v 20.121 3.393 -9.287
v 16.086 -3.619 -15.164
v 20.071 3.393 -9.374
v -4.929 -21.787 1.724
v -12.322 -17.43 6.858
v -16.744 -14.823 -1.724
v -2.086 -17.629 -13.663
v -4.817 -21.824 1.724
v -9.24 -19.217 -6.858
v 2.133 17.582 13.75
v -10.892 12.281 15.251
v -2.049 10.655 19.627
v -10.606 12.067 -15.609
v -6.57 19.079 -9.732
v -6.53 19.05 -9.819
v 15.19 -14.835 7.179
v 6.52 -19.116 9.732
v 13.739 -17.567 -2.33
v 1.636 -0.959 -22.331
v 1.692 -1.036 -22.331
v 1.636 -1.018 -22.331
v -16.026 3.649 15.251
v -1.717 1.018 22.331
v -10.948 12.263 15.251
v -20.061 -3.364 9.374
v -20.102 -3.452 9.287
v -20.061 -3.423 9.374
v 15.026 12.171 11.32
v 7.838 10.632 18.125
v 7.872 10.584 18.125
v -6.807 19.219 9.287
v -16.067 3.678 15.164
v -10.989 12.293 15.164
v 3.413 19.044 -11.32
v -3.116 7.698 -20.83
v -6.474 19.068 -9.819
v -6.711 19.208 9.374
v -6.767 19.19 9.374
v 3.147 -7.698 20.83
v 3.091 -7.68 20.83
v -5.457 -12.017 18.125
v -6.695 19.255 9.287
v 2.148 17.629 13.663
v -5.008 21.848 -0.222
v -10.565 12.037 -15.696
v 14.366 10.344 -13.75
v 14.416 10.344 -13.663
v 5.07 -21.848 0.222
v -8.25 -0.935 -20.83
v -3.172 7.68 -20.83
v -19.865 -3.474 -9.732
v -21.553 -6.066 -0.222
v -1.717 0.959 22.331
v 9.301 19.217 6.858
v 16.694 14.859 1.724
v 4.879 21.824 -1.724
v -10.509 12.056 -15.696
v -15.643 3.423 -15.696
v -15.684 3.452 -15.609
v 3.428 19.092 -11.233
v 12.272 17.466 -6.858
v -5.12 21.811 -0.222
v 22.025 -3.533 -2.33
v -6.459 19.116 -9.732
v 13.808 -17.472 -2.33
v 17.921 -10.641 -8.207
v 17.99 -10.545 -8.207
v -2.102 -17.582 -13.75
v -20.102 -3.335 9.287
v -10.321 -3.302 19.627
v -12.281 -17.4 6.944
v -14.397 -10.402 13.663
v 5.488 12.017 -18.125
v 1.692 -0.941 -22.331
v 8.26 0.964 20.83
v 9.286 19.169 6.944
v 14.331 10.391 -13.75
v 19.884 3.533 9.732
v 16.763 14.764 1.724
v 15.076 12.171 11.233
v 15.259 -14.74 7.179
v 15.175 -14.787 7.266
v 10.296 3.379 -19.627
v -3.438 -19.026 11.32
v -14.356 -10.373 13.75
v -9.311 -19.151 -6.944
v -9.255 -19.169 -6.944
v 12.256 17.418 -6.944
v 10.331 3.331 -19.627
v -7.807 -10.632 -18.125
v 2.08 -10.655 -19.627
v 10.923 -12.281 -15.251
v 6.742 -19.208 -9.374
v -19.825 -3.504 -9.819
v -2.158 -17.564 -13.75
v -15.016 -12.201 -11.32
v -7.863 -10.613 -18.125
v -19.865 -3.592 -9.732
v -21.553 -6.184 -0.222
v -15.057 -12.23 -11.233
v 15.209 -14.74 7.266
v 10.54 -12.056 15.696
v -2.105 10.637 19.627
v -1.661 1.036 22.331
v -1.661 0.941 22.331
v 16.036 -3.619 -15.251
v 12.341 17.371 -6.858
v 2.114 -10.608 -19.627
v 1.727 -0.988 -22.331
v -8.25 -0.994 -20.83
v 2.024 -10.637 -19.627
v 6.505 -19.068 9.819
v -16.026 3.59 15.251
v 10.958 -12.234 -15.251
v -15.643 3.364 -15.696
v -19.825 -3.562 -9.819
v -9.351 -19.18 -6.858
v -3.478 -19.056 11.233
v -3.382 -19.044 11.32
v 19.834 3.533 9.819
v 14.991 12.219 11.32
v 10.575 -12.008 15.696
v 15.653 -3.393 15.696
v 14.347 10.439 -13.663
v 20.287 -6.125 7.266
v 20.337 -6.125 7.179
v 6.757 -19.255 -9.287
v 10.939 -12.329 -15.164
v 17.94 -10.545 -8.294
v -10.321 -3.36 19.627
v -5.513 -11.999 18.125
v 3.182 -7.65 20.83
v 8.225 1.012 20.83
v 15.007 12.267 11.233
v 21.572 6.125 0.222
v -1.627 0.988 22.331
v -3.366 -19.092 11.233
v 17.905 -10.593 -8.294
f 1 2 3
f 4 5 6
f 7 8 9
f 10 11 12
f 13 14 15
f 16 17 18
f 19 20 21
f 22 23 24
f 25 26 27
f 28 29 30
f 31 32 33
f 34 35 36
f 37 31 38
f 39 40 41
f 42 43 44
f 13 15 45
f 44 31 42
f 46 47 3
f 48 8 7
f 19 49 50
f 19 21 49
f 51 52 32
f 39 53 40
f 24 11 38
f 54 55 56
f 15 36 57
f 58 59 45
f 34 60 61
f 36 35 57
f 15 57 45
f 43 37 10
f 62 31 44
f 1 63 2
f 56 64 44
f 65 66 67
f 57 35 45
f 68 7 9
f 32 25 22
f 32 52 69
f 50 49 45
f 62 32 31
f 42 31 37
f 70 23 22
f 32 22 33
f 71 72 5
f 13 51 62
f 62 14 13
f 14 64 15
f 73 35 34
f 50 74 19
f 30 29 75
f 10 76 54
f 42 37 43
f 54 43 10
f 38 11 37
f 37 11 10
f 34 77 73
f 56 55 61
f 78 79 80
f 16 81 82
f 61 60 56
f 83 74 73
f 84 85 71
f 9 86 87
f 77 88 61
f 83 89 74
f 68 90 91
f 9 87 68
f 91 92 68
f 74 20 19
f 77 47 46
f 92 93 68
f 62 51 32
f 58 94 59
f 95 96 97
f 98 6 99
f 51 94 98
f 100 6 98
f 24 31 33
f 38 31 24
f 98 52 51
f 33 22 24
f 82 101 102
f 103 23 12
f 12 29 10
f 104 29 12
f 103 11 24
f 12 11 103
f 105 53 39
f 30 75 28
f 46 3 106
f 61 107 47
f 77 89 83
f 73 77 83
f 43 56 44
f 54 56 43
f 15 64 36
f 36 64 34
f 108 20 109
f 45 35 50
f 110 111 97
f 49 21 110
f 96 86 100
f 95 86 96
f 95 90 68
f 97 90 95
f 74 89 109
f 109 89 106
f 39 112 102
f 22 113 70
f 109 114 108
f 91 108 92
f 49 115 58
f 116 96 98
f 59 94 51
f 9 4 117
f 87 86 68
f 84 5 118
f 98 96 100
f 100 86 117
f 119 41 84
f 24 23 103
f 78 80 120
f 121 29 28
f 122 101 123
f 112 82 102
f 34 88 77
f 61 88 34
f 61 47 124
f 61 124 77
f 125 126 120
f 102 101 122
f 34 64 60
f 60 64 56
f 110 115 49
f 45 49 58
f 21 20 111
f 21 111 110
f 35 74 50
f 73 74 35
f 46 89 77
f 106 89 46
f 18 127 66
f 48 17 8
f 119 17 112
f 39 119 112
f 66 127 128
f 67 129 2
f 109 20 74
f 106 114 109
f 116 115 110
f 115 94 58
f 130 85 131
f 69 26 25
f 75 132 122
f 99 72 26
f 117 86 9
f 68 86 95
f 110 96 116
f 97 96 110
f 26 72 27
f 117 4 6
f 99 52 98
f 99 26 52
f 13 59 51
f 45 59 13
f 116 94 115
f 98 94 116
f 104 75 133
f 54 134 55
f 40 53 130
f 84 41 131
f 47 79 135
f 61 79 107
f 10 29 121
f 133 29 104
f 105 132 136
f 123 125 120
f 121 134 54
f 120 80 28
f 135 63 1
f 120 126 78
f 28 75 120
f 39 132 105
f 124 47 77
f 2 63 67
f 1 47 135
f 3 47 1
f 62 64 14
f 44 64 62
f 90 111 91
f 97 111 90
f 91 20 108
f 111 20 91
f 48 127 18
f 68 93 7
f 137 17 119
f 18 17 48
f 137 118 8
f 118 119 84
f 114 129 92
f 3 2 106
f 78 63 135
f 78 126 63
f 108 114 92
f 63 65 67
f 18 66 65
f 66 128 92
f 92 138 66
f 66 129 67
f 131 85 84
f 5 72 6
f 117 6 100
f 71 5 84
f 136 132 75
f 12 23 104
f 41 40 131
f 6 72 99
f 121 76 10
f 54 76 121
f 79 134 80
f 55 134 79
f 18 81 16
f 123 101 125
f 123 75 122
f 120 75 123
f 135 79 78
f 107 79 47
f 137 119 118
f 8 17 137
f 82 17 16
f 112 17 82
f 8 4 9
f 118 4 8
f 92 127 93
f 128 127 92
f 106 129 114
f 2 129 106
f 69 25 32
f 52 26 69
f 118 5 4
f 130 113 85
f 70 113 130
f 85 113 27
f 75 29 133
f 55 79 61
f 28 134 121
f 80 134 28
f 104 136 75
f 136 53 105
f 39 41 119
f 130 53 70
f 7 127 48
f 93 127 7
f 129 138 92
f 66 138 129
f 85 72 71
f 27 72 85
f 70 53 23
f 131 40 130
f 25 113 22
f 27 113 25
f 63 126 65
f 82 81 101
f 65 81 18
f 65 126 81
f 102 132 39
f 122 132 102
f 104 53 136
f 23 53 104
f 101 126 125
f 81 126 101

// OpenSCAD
// Auto-generated OpenSCAD file

    inner_points = 10*[[-2.147181721933595, -0.6125228911105931, -0.022233721226839975], [1.4975738002339152, 1.2171443618142557, 1.123343354837028], [-1.6663340255978591, -1.4763745869015392, -0.1723861125089058], [1.9784214965696507, 0.35329266602330955, 0.9731909635549623], [-1.9784214965696507, -0.35329266602330955, -0.9731909635549623], [1.6663340255978591, 1.4763745869015392, 0.1723861125089058], [-1.4975738002339152, -1.2171443618142557, -1.123343354837028], [2.147181721933595, 0.6125228911105931, 0.022233721226839975], [-1.0280687737374308, -0.3330955036984619, 1.954018925031606], [-0.1676587091381568, 0.0988303441971033, 2.224452988448126], [-0.547221077401695, -1.1969471994894083, 1.80386653374954], [0.313188987197579, -0.765021351593843, 2.07430059716606], [-0.313188987197579, 0.765021351593843, -2.07430059716606], [0.547221077401695, 1.1969471994894083, -1.80386653374954], [0.1676587091381568, -0.0988303441971033, -2.224452988448126], [1.0280687737374308, 0.3330955036984619, -1.954018925031606], [-0.6726268446335121, 1.9160150643285994, 0.9287235210998099], [0.503866619269568, -2.1752452894158827, 0.022233721228312353], [2.0237176723082113, -0.6125228911102443, 0.7179487921524583], [-0.503866619269568, 2.1752452894158827, -0.022233721228312353], [0.6726268446335121, -1.9160150643285994, -0.9287235210998099], [2.1924778976721555, -0.3532926660229606, -0.23300845017566402], [0.927058622781811, 1.9121577495628521, 0.685771848512618], [-0.927058622781811, -1.9121577495628521, -0.685771848512618], [1.3708203463401416, -1.7471767562861986, -0.23300845017492777], [-1.4315815123496172, -1.0343501578436425, 1.3662950274254113], [0.8210012810337749, 0.09644639256656445, 2.0743005971656054], [-0.8210012810337749, -0.09644639256656445, -2.0743005971656054], [1.4315815123496172, 1.0343501578436425, -1.3662950274254113], [-1.0907716573533395, 1.2233856282105418, 1.516447418706741], [0.6489516514014413, -1.9020591684003363, 0.9731909635561535], [-0.6489516514014413, 1.9020591684003363, -0.9731909635561535], [1.0907716573533395, -1.2233856282105418, -1.516447418706741], [-2.0020966898017214, -0.33933677009504604, 0.9287235211010012], [0.7822487677665146, 1.0584046349342373, 1.8038665337483493], [-1.2240687737184126, -1.7370781751240318, 0.6857718485145453], [1.5602766838498234, -0.3393367700947481, 1.5609148611618933], [-1.5602766838498234, 0.3393367700947481, -1.5609148611618933], [1.2240687737184126, 1.7370781751240318, -0.6857718485145453], [-0.7822487677665146, -1.0584046349342373, -1.8038665337483493], [2.0020966898017214, 0.33933677009504604, -0.9287235211010012], [-1.5985839511895352, 0.36191788405013425, 1.516447418707196], [-0.20641122240541715, 1.0607885865647761, 1.9540189250308702], [-0.33970833877049067, -1.8996752167697974, 1.1233433548386742], [1.0524643900136275, -1.2008045142551556, 1.5609148611623485], [-1.0524643900136275, 1.2008045142551556, -1.5609148611623485], [0.33970833877049067, 1.8996752167697974, -1.1233433548386742], [0.20641122240541715, -1.0607885865647761, -1.9540189250308702], [1.5985839511895352, -0.36191788405013425, -1.516447418707196], [0.21173359031441008, 1.7534180226828338, 1.366295027423939], [-0.48479337090236396, -2.1728613377853443, 0.17238611251083324], [1.5159053784720158, -1.473990635270652, 0.7179487921529134], [0.48479337090236396, 2.1728613377853443, -0.17238611251083324], [-0.21173359031441008, -1.7534180226828338, -1.366295027423939], [1.7889651590599696, -1.0545473201681412, -0.8207323477818588]];

    outer_points = 10*[[0.8723958733185133, 0.06615064908058033, -2.0544141523419364], [0.15751608677391848, -1.0319662062139903, 1.973905369854271], [0.8270996975796362, 1.0319662062139903, -1.7991719809389455], [0.11221991103504136, -0.06615064908058033, 2.229147541257262], [-0.11221991103504136, 0.06615064908058033, -2.229147541257262], [-0.8270996975796362, -1.0319662062139903, 1.7991719809389455], [-0.15751608677391848, 1.0319662062139903, -1.973905369854271], [-0.8723958733185133, -0.06615064908058033, 2.0544141523419364], [2.1924778976724366, -0.35329266602279574, -0.23300845017327093], [2.0237176723073724, -0.6125228911106142, 0.7179487921545069], [2.1471817219335594, 0.6125228911106142, 0.022233721229720005], [1.9784214965684954, 0.35329266602279574, 0.9731909635574978], [-1.9784214965684954, -0.35329266602279574, -0.9731909635574978], [-2.1471817219335594, -0.6125228911106142, -0.022233721229720005], [-2.0237176723073724, 0.6125228911106142, -0.7179487921545069], [-2.1924778976724366, 0.35329266602279574, 0.23300845017327093], [0.5038666192695755, -2.1752452894158876, 0.022233721227690392], [0.4807491650839791, 2.1752452894158876, 0.15249966768763507], [0.14717764696877234, 0.9136323277340612, 2.0321620721418276], [-0.4807491650839791, -2.1752452894158876, -0.15249966768763507], [-0.5038666192695755, 2.1752452894158876, -0.022233721227690392], [-0.8374381373847823, 0.9136323277340612, 1.8574286832265023], [-0.24599665183756222, -1.7332208603588481, 1.3861814722472068], [0.24599665183756222, 1.7332208603588481, -1.3861814722472068], [-0.16086561818353615, 2.034330296982295, 0.9064714408993516], [2.0020966898028134, 0.33933677009559726, -0.9287235210984455], [1.5602766838479842, -0.33933677009559726, 1.560914861163547], [-1.5602766838479842, 0.33933677009559726, -1.560914861163547], [-2.0020966898028134, -0.33933677009559726, 0.9287235210984455], [1.3708203463404445, -1.7471767562860465, -0.23300845017428576], [1.2069372429567986, 1.7471767562860465, 0.690466401324062], [-1.2069372429567986, -1.7471767562860465, -0.690466401324062], [-1.3708203463404445, 1.7471767562860465, 0.23300845017428576], [1.598583951191333, -0.3619178840492606, -1.5164474187055097], [1.0524643900118018, -1.2008045142560126, 1.56091486116292], [1.5252931992854413, 1.2008045142560126, -1.103456910013144], [0.9791736381059102, 0.3619178840492606, 1.9739053698552858], [-0.9791736381059102, -0.3619178840492606, -1.9739053698552858], [-1.5252931992854413, -1.2008045142560126, 1.103456910013144], [-1.0524643900118018, 1.2008045142560126, -1.56091486116292], [-1.598583951191333, 0.3619178840492606, 1.5164474187055097], [1.7889651590609557, -1.0545473201676536, -0.820732347780335], [1.5159053784711902, -1.4739906352710297, 0.7179487921538799], [1.6703782314161868, 1.4739906352710297, -0.1524996676849783], [1.3973184508264214, 1.0545473201676536, 1.3861814722492365], [-1.3973184508264214, -1.0545473201676536, -1.3861814722492365], [-1.6703782314161868, -1.4739906352710297, 0.1524996676849783], [-1.5159053784711902, 1.4739906352710297, -0.7179487921538799], [-1.7889651590609557, 1.0545473201676536, 0.820732347780335], [0.6489516514003212, -1.9020591684008705, 0.9731909635558559], [0.9441901535433673, 1.9020591684008705, -0.6904664013214051], [0.5653224596892834, 1.6062617638524541, 1.4444381745357786], [-0.9441901535433673, -1.9020591684008705, 0.6904664013214051], [-0.6489516514003212, 1.9020591684008705, -0.9731909635558559], [-1.027819345254405, 1.6062617638524541, 1.1617136123013276]];

    // Convex hull for inner set (I)
    module inner_hull() {
        hull() {
            for (p = inner_points) {
                translate(p) sphere(r=0.1);
            }
        }
    }

    // Convex hull for outer set (O) minus inner hull (O \ I)
    module outer_minus_inner() {
        difference() {
            hull() {
                for (p = outer_points) {
                    translate(p) sphere(r=0.1);
                }
            }
            inner_hull(); // Subtract inner hull
        }
    }

    // Convex hull for outer set (O) minus all translated inner hulls
    module outer_minus_AllTranslationInner() {
        difference() {
            hull() {
                for (p = outer_points) {
                    translate(p) sphere(r=0.1);
                }
            }
            hull() {
                translate([0,0,50]) inner_hull();
                translate([0,0,-50]) inner_hull();
            }; // Subtract translated inner hulls
        }
    }

    // Difference between outer_minus_inner and outer_minus_AllTranslationInner
    module outer_minus_inner_diff() {
        difference() {
            // Outer minus inner
            difference() {
                hull() {
                    for (p = outer_points) {
                        translate(p) sphere(r=0.1);
                    }
                }
                inner_hull();
            }

            // Subtract Outer minus AllTranslationInner
            difference() {
                hull() {
                    for (p = outer_points) {
                        translate(p) sphere(r=0.1);
                    }
                }
                hull() {
                    translate([0,0,50]) inner_hull();
                    translate([0,0,-50]) inner_hull();
                };
            }
        }
    }

    // Rendering all with colors applied
    color([1, 0, 0, 0.5]) inner_hull(); // Transparent red
    
